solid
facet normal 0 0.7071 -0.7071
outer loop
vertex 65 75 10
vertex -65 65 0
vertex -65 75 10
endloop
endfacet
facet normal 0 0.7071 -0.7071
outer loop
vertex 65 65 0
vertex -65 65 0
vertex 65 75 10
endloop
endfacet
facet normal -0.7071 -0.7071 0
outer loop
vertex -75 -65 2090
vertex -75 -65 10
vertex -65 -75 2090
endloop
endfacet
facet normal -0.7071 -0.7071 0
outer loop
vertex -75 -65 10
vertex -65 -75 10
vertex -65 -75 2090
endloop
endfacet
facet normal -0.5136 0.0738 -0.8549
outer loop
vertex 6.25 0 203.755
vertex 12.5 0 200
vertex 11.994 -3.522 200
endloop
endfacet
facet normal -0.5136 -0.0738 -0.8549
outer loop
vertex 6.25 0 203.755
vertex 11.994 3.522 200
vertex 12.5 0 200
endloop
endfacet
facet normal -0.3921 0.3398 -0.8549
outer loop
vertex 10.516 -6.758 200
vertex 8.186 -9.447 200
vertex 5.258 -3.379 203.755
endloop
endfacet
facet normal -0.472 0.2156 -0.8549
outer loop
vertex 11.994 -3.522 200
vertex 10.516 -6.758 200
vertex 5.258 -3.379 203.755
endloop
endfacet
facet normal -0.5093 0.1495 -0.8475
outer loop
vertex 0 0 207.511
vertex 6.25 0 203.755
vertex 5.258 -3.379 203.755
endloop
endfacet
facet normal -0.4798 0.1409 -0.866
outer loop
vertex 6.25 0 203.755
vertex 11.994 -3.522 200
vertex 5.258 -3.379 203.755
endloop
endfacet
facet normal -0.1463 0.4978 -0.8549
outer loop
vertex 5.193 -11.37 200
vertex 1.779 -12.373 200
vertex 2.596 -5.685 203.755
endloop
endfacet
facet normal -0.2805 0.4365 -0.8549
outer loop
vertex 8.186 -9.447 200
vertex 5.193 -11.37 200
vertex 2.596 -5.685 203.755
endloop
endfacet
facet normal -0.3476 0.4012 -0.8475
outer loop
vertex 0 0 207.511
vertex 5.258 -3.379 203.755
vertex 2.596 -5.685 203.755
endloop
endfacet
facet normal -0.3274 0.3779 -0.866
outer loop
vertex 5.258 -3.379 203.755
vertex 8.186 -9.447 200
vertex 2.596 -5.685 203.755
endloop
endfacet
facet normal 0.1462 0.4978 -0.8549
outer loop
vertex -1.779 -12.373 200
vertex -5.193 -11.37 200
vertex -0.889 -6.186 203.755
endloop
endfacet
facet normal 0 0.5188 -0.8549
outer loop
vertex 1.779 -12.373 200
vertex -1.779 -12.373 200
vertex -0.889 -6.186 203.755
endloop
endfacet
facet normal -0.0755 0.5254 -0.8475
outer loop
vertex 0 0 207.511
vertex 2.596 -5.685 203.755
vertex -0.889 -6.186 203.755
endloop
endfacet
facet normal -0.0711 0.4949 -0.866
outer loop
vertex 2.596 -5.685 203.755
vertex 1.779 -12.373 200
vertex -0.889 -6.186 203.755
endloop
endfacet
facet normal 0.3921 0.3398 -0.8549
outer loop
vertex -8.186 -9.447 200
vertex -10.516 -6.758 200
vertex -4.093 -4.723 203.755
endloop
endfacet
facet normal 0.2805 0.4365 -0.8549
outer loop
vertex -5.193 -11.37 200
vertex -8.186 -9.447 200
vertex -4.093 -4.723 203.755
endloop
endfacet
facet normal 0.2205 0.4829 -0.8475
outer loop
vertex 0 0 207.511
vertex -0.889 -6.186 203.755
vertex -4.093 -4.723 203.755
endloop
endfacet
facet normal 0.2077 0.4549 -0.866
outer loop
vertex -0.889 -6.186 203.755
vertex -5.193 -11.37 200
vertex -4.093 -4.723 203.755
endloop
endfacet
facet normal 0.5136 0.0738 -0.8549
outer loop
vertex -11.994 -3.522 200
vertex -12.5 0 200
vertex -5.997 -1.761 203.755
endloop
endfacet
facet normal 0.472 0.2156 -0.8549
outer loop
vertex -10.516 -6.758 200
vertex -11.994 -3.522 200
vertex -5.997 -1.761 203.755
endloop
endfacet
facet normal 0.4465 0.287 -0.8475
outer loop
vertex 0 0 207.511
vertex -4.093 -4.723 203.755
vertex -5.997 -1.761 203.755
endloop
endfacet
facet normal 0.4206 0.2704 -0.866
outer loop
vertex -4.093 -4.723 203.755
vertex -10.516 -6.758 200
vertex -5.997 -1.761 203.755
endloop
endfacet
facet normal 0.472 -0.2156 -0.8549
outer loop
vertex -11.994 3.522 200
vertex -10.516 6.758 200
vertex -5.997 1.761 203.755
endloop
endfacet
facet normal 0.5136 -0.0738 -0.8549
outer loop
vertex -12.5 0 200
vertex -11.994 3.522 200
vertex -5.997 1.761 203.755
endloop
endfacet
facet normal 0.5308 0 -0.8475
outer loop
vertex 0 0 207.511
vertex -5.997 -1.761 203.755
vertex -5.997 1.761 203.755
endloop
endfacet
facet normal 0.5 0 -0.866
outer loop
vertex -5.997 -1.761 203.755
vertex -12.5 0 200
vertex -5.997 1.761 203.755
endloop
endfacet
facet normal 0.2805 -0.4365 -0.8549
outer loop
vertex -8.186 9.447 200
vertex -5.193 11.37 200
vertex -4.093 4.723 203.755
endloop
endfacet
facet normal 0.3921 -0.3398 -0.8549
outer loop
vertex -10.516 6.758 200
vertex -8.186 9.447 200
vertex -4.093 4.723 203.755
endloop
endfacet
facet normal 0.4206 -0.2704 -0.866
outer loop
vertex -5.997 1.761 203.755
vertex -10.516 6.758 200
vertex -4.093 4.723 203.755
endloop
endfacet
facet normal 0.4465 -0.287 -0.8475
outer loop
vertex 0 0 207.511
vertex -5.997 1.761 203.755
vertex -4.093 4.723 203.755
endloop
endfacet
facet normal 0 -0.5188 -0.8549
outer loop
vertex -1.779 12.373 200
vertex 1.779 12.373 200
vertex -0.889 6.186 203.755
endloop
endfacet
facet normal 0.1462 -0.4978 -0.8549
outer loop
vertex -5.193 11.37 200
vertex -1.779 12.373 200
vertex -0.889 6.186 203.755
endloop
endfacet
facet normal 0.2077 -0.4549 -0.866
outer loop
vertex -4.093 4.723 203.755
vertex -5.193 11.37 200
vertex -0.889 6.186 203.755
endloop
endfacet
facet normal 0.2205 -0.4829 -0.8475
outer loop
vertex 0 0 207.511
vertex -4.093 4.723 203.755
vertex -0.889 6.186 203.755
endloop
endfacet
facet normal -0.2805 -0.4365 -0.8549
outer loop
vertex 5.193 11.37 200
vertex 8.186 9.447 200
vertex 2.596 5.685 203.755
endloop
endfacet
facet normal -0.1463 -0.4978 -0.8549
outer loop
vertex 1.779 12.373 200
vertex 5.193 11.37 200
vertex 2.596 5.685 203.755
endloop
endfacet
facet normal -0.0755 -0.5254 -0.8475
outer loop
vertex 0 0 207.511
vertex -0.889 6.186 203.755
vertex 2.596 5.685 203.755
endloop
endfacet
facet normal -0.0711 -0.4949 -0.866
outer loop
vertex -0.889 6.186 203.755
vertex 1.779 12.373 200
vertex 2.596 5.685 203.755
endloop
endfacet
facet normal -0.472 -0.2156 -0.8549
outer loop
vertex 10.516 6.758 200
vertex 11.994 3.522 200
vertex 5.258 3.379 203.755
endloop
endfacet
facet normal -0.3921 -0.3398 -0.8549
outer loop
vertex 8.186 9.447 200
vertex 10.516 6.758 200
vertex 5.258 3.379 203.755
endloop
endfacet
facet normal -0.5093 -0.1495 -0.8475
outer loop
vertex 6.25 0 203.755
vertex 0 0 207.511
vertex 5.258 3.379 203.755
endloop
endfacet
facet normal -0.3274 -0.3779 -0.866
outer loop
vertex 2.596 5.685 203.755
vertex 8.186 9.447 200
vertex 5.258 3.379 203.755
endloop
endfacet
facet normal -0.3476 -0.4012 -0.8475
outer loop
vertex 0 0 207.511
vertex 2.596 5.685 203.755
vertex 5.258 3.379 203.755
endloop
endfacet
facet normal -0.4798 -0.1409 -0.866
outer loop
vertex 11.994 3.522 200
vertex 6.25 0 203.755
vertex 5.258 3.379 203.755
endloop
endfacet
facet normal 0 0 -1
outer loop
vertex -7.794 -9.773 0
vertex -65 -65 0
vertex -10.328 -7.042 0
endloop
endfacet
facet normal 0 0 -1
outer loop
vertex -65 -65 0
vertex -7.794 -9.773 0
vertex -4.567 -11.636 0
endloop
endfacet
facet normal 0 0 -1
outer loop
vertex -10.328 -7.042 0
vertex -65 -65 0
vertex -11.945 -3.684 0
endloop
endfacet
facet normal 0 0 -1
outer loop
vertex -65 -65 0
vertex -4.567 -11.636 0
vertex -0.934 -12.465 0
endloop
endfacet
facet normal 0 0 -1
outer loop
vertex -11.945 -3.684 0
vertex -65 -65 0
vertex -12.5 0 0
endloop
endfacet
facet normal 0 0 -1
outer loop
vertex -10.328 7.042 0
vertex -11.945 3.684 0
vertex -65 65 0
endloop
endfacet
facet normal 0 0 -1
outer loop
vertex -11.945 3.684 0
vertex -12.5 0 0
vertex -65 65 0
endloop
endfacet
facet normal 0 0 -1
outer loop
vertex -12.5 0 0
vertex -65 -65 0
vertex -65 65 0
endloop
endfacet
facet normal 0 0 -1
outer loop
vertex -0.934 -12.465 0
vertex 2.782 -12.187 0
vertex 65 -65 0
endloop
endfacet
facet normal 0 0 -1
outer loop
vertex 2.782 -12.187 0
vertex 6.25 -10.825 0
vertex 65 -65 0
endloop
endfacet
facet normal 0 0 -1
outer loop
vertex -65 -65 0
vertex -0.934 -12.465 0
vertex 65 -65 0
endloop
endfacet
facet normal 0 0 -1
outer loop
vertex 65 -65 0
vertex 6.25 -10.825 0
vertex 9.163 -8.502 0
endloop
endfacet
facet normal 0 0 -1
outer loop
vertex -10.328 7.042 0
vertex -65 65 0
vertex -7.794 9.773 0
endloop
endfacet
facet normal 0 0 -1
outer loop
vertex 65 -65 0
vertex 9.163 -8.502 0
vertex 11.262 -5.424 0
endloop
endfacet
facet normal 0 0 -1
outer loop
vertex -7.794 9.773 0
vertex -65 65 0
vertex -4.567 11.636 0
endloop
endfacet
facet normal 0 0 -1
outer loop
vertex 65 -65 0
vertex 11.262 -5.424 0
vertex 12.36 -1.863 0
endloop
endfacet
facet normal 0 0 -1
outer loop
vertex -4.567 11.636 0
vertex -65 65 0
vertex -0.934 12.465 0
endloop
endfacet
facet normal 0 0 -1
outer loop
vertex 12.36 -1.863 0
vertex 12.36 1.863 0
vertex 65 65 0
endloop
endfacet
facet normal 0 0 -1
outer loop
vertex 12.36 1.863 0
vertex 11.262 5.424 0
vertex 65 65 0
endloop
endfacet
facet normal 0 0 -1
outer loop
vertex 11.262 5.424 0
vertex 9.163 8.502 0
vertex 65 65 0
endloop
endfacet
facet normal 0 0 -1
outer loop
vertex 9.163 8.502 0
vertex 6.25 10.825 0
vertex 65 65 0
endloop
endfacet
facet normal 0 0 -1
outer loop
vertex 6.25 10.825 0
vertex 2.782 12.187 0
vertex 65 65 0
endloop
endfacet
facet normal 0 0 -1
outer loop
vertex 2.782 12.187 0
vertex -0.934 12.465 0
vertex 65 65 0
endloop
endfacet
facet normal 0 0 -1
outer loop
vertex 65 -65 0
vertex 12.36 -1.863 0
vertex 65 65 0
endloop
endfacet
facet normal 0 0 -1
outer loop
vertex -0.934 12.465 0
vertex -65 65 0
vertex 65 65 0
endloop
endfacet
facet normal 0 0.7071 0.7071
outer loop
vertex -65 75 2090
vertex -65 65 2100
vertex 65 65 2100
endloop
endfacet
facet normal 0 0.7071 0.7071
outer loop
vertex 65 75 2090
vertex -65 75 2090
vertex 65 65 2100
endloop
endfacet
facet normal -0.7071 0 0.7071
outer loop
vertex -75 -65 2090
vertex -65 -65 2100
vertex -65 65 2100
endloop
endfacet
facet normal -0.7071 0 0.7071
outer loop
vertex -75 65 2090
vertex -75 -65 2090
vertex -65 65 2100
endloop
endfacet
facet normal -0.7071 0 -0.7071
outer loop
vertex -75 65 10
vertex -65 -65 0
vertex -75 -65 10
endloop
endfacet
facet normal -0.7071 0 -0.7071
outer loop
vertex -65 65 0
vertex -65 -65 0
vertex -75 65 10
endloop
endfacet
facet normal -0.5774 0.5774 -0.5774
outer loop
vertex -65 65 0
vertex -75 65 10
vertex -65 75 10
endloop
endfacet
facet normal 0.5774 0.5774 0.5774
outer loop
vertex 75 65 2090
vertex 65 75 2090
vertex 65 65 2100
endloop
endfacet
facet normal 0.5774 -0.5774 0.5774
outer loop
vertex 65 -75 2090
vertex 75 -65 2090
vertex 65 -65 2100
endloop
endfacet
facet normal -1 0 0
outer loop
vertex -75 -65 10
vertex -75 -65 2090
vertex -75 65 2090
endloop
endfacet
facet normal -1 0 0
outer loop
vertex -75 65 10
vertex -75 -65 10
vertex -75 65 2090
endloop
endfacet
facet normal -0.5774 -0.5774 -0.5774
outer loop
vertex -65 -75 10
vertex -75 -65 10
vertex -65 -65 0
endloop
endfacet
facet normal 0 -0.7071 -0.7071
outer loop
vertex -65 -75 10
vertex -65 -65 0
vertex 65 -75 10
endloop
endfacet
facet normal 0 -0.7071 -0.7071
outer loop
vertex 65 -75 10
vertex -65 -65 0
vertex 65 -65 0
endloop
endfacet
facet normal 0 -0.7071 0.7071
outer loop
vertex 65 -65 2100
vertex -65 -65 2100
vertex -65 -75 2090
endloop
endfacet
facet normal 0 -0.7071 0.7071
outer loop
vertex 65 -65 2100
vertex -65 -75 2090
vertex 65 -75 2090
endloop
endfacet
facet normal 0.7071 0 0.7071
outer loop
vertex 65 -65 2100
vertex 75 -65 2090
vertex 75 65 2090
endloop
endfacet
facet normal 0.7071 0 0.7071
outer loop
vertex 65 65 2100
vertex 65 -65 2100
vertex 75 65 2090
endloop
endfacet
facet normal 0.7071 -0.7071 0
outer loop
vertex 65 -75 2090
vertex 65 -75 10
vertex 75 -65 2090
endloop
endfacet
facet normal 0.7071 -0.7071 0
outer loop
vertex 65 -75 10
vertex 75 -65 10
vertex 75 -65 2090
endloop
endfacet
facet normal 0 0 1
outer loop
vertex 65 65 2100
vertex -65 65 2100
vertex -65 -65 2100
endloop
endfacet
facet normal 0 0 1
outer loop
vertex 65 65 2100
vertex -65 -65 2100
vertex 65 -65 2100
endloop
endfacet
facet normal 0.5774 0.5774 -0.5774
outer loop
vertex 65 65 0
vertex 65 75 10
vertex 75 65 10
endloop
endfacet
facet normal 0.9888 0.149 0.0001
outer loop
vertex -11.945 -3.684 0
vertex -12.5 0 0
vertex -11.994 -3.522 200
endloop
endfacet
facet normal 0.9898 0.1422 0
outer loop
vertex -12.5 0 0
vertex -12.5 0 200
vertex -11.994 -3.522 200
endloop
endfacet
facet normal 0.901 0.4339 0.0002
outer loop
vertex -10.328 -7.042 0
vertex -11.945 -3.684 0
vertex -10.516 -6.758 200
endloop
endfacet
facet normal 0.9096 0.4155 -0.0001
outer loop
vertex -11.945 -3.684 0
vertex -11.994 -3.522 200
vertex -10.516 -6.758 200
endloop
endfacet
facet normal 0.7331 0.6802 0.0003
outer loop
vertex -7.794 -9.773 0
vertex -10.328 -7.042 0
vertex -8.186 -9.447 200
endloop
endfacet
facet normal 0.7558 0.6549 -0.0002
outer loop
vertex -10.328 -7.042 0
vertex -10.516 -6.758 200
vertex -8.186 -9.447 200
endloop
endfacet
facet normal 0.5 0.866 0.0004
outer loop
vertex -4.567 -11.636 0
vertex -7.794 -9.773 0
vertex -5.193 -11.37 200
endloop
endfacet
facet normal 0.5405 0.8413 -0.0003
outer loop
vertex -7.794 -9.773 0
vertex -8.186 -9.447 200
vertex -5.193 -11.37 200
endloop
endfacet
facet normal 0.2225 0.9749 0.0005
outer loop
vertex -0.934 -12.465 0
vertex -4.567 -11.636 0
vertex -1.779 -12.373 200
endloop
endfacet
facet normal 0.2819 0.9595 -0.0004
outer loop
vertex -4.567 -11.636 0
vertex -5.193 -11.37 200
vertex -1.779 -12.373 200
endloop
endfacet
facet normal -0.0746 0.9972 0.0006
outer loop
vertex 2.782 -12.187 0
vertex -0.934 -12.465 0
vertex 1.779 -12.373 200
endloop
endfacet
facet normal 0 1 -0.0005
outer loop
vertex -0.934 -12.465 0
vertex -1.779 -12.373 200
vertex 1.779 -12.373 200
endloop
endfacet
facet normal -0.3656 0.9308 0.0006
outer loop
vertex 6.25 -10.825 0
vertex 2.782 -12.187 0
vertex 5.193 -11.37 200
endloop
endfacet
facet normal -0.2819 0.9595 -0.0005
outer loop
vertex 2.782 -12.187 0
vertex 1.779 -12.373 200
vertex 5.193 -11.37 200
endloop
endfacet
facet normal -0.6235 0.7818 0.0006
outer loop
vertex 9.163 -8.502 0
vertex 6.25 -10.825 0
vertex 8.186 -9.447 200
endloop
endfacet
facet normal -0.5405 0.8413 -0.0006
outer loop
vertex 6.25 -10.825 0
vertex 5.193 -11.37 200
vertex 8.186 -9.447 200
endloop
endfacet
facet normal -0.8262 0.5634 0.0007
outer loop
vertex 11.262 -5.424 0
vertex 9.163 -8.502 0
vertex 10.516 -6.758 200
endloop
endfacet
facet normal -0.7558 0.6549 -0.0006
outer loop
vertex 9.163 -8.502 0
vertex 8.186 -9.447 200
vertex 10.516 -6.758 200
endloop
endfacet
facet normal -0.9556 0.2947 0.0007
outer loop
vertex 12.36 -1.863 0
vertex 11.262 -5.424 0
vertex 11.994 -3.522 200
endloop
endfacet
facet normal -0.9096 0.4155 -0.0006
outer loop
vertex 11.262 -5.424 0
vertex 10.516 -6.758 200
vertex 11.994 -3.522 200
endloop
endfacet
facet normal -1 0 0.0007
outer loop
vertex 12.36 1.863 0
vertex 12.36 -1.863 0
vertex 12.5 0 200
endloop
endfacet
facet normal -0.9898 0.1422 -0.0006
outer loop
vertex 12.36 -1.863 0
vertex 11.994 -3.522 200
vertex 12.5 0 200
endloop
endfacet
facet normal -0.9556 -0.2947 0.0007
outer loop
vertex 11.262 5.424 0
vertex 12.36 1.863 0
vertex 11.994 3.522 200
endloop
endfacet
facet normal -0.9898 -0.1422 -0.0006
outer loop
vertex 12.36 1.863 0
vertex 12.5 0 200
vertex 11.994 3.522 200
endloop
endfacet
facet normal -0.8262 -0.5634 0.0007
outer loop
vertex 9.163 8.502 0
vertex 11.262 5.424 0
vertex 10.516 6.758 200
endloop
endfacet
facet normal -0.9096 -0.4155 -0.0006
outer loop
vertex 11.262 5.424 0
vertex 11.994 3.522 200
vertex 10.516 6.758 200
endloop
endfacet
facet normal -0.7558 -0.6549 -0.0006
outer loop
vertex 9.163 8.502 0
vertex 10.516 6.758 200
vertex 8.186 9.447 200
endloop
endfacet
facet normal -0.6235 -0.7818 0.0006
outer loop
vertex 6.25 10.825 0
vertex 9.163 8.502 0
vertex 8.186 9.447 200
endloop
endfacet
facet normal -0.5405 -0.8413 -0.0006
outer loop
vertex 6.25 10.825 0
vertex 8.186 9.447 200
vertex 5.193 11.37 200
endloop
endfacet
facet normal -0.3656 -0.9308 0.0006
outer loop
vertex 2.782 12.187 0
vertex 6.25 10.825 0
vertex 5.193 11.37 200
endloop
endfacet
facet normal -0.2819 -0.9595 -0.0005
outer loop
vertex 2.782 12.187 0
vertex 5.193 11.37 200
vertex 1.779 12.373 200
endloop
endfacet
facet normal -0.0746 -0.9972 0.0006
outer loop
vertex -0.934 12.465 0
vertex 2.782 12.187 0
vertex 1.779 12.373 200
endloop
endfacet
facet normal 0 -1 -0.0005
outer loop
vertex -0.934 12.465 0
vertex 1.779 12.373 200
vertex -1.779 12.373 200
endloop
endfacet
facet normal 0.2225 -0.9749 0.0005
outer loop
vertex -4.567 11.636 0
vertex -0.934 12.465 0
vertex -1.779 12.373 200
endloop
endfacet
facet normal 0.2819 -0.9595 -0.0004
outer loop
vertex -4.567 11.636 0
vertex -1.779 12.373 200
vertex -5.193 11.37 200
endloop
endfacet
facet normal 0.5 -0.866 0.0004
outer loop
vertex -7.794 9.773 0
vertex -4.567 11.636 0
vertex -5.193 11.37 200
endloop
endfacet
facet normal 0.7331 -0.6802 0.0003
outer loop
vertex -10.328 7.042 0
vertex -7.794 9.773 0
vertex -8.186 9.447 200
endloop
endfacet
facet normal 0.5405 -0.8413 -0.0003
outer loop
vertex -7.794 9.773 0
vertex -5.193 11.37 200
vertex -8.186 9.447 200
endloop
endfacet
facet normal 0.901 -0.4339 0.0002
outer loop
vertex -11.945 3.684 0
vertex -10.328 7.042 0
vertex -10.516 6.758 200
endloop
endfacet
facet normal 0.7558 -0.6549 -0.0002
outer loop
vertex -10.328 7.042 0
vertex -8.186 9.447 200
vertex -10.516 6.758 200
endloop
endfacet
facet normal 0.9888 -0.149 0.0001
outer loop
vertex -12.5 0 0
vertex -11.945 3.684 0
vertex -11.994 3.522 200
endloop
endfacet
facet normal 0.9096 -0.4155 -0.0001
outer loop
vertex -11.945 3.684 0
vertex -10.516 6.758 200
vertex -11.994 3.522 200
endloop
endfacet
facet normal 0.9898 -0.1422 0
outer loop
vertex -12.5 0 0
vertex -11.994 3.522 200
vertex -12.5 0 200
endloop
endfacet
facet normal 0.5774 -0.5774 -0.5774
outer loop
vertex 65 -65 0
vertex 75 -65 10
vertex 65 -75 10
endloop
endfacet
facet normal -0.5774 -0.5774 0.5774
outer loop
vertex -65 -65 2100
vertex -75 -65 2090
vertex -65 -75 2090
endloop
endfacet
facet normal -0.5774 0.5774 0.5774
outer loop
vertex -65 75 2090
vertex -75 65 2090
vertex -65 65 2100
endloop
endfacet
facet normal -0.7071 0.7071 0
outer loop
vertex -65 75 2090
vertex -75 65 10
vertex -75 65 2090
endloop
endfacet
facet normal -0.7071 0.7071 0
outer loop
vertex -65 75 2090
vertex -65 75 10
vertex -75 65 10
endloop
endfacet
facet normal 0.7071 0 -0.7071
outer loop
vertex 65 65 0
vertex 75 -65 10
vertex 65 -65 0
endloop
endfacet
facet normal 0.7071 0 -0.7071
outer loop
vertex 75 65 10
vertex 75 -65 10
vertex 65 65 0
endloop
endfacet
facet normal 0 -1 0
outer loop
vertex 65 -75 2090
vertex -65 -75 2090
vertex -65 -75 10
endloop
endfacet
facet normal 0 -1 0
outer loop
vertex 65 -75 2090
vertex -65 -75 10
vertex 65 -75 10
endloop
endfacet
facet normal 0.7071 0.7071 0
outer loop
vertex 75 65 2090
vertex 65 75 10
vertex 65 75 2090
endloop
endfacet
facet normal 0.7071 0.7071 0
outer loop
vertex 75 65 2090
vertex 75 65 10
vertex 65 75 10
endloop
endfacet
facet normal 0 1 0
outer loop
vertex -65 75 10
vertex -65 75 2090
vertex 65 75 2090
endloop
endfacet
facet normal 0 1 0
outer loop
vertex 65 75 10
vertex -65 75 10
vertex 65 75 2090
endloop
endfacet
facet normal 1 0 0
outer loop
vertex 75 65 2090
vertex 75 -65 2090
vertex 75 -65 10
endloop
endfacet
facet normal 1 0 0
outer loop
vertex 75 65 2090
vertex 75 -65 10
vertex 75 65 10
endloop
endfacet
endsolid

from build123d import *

# Parameters (mm, degrees)
F0_W     = 150
F0_H     = 150
F1_DEPTH = 2100
F3_D     = 25
F3_DEPTH = 200
F3_TIP   = 7.5107577378
F4_SIZE  = 10


with BuildPart() as f1:
    # F0 (on Top) → F1 (new body)
    with BuildSketch(Plane.XY):
        Rectangle(F0_W, F0_H)
    extrude(amount=F1_DEPTH)

    # F3
    with Locations(Plane(origin=(0, 0, 0), x_dir=(1, 0, 0), z_dir=(0, 0, -1))):
        with Locations((0, 0)):
            Hole(F3_D / 2, depth=F3_DEPTH)
            with Locations((0, 0, -(F3_DEPTH + F3_TIP / 2))):  # 118° drill point
                Cone(0, F3_D / 2, F3_TIP, mode=Mode.SUBTRACT)

    # F4
    f4_edges = [f1.edges().sort_by_distance(p)[0] for p in [
        (-75, 75, 1050),
        (-75, -75, 1050),
        (-75, 0, 0),
        (-75, 0, 2100),
        (0, 75, 2100),
        (75, 75, 1050),
        (0, 75, 0),
        (75, -75, 1050),
        (75, 0, 0),
        (75, 0, 2100),
        (0, -75, 0),
        (0, -75, 2100),
    ]]
    chamfer(f4_edges, length=F4_SIZE)


solid = f1.part
